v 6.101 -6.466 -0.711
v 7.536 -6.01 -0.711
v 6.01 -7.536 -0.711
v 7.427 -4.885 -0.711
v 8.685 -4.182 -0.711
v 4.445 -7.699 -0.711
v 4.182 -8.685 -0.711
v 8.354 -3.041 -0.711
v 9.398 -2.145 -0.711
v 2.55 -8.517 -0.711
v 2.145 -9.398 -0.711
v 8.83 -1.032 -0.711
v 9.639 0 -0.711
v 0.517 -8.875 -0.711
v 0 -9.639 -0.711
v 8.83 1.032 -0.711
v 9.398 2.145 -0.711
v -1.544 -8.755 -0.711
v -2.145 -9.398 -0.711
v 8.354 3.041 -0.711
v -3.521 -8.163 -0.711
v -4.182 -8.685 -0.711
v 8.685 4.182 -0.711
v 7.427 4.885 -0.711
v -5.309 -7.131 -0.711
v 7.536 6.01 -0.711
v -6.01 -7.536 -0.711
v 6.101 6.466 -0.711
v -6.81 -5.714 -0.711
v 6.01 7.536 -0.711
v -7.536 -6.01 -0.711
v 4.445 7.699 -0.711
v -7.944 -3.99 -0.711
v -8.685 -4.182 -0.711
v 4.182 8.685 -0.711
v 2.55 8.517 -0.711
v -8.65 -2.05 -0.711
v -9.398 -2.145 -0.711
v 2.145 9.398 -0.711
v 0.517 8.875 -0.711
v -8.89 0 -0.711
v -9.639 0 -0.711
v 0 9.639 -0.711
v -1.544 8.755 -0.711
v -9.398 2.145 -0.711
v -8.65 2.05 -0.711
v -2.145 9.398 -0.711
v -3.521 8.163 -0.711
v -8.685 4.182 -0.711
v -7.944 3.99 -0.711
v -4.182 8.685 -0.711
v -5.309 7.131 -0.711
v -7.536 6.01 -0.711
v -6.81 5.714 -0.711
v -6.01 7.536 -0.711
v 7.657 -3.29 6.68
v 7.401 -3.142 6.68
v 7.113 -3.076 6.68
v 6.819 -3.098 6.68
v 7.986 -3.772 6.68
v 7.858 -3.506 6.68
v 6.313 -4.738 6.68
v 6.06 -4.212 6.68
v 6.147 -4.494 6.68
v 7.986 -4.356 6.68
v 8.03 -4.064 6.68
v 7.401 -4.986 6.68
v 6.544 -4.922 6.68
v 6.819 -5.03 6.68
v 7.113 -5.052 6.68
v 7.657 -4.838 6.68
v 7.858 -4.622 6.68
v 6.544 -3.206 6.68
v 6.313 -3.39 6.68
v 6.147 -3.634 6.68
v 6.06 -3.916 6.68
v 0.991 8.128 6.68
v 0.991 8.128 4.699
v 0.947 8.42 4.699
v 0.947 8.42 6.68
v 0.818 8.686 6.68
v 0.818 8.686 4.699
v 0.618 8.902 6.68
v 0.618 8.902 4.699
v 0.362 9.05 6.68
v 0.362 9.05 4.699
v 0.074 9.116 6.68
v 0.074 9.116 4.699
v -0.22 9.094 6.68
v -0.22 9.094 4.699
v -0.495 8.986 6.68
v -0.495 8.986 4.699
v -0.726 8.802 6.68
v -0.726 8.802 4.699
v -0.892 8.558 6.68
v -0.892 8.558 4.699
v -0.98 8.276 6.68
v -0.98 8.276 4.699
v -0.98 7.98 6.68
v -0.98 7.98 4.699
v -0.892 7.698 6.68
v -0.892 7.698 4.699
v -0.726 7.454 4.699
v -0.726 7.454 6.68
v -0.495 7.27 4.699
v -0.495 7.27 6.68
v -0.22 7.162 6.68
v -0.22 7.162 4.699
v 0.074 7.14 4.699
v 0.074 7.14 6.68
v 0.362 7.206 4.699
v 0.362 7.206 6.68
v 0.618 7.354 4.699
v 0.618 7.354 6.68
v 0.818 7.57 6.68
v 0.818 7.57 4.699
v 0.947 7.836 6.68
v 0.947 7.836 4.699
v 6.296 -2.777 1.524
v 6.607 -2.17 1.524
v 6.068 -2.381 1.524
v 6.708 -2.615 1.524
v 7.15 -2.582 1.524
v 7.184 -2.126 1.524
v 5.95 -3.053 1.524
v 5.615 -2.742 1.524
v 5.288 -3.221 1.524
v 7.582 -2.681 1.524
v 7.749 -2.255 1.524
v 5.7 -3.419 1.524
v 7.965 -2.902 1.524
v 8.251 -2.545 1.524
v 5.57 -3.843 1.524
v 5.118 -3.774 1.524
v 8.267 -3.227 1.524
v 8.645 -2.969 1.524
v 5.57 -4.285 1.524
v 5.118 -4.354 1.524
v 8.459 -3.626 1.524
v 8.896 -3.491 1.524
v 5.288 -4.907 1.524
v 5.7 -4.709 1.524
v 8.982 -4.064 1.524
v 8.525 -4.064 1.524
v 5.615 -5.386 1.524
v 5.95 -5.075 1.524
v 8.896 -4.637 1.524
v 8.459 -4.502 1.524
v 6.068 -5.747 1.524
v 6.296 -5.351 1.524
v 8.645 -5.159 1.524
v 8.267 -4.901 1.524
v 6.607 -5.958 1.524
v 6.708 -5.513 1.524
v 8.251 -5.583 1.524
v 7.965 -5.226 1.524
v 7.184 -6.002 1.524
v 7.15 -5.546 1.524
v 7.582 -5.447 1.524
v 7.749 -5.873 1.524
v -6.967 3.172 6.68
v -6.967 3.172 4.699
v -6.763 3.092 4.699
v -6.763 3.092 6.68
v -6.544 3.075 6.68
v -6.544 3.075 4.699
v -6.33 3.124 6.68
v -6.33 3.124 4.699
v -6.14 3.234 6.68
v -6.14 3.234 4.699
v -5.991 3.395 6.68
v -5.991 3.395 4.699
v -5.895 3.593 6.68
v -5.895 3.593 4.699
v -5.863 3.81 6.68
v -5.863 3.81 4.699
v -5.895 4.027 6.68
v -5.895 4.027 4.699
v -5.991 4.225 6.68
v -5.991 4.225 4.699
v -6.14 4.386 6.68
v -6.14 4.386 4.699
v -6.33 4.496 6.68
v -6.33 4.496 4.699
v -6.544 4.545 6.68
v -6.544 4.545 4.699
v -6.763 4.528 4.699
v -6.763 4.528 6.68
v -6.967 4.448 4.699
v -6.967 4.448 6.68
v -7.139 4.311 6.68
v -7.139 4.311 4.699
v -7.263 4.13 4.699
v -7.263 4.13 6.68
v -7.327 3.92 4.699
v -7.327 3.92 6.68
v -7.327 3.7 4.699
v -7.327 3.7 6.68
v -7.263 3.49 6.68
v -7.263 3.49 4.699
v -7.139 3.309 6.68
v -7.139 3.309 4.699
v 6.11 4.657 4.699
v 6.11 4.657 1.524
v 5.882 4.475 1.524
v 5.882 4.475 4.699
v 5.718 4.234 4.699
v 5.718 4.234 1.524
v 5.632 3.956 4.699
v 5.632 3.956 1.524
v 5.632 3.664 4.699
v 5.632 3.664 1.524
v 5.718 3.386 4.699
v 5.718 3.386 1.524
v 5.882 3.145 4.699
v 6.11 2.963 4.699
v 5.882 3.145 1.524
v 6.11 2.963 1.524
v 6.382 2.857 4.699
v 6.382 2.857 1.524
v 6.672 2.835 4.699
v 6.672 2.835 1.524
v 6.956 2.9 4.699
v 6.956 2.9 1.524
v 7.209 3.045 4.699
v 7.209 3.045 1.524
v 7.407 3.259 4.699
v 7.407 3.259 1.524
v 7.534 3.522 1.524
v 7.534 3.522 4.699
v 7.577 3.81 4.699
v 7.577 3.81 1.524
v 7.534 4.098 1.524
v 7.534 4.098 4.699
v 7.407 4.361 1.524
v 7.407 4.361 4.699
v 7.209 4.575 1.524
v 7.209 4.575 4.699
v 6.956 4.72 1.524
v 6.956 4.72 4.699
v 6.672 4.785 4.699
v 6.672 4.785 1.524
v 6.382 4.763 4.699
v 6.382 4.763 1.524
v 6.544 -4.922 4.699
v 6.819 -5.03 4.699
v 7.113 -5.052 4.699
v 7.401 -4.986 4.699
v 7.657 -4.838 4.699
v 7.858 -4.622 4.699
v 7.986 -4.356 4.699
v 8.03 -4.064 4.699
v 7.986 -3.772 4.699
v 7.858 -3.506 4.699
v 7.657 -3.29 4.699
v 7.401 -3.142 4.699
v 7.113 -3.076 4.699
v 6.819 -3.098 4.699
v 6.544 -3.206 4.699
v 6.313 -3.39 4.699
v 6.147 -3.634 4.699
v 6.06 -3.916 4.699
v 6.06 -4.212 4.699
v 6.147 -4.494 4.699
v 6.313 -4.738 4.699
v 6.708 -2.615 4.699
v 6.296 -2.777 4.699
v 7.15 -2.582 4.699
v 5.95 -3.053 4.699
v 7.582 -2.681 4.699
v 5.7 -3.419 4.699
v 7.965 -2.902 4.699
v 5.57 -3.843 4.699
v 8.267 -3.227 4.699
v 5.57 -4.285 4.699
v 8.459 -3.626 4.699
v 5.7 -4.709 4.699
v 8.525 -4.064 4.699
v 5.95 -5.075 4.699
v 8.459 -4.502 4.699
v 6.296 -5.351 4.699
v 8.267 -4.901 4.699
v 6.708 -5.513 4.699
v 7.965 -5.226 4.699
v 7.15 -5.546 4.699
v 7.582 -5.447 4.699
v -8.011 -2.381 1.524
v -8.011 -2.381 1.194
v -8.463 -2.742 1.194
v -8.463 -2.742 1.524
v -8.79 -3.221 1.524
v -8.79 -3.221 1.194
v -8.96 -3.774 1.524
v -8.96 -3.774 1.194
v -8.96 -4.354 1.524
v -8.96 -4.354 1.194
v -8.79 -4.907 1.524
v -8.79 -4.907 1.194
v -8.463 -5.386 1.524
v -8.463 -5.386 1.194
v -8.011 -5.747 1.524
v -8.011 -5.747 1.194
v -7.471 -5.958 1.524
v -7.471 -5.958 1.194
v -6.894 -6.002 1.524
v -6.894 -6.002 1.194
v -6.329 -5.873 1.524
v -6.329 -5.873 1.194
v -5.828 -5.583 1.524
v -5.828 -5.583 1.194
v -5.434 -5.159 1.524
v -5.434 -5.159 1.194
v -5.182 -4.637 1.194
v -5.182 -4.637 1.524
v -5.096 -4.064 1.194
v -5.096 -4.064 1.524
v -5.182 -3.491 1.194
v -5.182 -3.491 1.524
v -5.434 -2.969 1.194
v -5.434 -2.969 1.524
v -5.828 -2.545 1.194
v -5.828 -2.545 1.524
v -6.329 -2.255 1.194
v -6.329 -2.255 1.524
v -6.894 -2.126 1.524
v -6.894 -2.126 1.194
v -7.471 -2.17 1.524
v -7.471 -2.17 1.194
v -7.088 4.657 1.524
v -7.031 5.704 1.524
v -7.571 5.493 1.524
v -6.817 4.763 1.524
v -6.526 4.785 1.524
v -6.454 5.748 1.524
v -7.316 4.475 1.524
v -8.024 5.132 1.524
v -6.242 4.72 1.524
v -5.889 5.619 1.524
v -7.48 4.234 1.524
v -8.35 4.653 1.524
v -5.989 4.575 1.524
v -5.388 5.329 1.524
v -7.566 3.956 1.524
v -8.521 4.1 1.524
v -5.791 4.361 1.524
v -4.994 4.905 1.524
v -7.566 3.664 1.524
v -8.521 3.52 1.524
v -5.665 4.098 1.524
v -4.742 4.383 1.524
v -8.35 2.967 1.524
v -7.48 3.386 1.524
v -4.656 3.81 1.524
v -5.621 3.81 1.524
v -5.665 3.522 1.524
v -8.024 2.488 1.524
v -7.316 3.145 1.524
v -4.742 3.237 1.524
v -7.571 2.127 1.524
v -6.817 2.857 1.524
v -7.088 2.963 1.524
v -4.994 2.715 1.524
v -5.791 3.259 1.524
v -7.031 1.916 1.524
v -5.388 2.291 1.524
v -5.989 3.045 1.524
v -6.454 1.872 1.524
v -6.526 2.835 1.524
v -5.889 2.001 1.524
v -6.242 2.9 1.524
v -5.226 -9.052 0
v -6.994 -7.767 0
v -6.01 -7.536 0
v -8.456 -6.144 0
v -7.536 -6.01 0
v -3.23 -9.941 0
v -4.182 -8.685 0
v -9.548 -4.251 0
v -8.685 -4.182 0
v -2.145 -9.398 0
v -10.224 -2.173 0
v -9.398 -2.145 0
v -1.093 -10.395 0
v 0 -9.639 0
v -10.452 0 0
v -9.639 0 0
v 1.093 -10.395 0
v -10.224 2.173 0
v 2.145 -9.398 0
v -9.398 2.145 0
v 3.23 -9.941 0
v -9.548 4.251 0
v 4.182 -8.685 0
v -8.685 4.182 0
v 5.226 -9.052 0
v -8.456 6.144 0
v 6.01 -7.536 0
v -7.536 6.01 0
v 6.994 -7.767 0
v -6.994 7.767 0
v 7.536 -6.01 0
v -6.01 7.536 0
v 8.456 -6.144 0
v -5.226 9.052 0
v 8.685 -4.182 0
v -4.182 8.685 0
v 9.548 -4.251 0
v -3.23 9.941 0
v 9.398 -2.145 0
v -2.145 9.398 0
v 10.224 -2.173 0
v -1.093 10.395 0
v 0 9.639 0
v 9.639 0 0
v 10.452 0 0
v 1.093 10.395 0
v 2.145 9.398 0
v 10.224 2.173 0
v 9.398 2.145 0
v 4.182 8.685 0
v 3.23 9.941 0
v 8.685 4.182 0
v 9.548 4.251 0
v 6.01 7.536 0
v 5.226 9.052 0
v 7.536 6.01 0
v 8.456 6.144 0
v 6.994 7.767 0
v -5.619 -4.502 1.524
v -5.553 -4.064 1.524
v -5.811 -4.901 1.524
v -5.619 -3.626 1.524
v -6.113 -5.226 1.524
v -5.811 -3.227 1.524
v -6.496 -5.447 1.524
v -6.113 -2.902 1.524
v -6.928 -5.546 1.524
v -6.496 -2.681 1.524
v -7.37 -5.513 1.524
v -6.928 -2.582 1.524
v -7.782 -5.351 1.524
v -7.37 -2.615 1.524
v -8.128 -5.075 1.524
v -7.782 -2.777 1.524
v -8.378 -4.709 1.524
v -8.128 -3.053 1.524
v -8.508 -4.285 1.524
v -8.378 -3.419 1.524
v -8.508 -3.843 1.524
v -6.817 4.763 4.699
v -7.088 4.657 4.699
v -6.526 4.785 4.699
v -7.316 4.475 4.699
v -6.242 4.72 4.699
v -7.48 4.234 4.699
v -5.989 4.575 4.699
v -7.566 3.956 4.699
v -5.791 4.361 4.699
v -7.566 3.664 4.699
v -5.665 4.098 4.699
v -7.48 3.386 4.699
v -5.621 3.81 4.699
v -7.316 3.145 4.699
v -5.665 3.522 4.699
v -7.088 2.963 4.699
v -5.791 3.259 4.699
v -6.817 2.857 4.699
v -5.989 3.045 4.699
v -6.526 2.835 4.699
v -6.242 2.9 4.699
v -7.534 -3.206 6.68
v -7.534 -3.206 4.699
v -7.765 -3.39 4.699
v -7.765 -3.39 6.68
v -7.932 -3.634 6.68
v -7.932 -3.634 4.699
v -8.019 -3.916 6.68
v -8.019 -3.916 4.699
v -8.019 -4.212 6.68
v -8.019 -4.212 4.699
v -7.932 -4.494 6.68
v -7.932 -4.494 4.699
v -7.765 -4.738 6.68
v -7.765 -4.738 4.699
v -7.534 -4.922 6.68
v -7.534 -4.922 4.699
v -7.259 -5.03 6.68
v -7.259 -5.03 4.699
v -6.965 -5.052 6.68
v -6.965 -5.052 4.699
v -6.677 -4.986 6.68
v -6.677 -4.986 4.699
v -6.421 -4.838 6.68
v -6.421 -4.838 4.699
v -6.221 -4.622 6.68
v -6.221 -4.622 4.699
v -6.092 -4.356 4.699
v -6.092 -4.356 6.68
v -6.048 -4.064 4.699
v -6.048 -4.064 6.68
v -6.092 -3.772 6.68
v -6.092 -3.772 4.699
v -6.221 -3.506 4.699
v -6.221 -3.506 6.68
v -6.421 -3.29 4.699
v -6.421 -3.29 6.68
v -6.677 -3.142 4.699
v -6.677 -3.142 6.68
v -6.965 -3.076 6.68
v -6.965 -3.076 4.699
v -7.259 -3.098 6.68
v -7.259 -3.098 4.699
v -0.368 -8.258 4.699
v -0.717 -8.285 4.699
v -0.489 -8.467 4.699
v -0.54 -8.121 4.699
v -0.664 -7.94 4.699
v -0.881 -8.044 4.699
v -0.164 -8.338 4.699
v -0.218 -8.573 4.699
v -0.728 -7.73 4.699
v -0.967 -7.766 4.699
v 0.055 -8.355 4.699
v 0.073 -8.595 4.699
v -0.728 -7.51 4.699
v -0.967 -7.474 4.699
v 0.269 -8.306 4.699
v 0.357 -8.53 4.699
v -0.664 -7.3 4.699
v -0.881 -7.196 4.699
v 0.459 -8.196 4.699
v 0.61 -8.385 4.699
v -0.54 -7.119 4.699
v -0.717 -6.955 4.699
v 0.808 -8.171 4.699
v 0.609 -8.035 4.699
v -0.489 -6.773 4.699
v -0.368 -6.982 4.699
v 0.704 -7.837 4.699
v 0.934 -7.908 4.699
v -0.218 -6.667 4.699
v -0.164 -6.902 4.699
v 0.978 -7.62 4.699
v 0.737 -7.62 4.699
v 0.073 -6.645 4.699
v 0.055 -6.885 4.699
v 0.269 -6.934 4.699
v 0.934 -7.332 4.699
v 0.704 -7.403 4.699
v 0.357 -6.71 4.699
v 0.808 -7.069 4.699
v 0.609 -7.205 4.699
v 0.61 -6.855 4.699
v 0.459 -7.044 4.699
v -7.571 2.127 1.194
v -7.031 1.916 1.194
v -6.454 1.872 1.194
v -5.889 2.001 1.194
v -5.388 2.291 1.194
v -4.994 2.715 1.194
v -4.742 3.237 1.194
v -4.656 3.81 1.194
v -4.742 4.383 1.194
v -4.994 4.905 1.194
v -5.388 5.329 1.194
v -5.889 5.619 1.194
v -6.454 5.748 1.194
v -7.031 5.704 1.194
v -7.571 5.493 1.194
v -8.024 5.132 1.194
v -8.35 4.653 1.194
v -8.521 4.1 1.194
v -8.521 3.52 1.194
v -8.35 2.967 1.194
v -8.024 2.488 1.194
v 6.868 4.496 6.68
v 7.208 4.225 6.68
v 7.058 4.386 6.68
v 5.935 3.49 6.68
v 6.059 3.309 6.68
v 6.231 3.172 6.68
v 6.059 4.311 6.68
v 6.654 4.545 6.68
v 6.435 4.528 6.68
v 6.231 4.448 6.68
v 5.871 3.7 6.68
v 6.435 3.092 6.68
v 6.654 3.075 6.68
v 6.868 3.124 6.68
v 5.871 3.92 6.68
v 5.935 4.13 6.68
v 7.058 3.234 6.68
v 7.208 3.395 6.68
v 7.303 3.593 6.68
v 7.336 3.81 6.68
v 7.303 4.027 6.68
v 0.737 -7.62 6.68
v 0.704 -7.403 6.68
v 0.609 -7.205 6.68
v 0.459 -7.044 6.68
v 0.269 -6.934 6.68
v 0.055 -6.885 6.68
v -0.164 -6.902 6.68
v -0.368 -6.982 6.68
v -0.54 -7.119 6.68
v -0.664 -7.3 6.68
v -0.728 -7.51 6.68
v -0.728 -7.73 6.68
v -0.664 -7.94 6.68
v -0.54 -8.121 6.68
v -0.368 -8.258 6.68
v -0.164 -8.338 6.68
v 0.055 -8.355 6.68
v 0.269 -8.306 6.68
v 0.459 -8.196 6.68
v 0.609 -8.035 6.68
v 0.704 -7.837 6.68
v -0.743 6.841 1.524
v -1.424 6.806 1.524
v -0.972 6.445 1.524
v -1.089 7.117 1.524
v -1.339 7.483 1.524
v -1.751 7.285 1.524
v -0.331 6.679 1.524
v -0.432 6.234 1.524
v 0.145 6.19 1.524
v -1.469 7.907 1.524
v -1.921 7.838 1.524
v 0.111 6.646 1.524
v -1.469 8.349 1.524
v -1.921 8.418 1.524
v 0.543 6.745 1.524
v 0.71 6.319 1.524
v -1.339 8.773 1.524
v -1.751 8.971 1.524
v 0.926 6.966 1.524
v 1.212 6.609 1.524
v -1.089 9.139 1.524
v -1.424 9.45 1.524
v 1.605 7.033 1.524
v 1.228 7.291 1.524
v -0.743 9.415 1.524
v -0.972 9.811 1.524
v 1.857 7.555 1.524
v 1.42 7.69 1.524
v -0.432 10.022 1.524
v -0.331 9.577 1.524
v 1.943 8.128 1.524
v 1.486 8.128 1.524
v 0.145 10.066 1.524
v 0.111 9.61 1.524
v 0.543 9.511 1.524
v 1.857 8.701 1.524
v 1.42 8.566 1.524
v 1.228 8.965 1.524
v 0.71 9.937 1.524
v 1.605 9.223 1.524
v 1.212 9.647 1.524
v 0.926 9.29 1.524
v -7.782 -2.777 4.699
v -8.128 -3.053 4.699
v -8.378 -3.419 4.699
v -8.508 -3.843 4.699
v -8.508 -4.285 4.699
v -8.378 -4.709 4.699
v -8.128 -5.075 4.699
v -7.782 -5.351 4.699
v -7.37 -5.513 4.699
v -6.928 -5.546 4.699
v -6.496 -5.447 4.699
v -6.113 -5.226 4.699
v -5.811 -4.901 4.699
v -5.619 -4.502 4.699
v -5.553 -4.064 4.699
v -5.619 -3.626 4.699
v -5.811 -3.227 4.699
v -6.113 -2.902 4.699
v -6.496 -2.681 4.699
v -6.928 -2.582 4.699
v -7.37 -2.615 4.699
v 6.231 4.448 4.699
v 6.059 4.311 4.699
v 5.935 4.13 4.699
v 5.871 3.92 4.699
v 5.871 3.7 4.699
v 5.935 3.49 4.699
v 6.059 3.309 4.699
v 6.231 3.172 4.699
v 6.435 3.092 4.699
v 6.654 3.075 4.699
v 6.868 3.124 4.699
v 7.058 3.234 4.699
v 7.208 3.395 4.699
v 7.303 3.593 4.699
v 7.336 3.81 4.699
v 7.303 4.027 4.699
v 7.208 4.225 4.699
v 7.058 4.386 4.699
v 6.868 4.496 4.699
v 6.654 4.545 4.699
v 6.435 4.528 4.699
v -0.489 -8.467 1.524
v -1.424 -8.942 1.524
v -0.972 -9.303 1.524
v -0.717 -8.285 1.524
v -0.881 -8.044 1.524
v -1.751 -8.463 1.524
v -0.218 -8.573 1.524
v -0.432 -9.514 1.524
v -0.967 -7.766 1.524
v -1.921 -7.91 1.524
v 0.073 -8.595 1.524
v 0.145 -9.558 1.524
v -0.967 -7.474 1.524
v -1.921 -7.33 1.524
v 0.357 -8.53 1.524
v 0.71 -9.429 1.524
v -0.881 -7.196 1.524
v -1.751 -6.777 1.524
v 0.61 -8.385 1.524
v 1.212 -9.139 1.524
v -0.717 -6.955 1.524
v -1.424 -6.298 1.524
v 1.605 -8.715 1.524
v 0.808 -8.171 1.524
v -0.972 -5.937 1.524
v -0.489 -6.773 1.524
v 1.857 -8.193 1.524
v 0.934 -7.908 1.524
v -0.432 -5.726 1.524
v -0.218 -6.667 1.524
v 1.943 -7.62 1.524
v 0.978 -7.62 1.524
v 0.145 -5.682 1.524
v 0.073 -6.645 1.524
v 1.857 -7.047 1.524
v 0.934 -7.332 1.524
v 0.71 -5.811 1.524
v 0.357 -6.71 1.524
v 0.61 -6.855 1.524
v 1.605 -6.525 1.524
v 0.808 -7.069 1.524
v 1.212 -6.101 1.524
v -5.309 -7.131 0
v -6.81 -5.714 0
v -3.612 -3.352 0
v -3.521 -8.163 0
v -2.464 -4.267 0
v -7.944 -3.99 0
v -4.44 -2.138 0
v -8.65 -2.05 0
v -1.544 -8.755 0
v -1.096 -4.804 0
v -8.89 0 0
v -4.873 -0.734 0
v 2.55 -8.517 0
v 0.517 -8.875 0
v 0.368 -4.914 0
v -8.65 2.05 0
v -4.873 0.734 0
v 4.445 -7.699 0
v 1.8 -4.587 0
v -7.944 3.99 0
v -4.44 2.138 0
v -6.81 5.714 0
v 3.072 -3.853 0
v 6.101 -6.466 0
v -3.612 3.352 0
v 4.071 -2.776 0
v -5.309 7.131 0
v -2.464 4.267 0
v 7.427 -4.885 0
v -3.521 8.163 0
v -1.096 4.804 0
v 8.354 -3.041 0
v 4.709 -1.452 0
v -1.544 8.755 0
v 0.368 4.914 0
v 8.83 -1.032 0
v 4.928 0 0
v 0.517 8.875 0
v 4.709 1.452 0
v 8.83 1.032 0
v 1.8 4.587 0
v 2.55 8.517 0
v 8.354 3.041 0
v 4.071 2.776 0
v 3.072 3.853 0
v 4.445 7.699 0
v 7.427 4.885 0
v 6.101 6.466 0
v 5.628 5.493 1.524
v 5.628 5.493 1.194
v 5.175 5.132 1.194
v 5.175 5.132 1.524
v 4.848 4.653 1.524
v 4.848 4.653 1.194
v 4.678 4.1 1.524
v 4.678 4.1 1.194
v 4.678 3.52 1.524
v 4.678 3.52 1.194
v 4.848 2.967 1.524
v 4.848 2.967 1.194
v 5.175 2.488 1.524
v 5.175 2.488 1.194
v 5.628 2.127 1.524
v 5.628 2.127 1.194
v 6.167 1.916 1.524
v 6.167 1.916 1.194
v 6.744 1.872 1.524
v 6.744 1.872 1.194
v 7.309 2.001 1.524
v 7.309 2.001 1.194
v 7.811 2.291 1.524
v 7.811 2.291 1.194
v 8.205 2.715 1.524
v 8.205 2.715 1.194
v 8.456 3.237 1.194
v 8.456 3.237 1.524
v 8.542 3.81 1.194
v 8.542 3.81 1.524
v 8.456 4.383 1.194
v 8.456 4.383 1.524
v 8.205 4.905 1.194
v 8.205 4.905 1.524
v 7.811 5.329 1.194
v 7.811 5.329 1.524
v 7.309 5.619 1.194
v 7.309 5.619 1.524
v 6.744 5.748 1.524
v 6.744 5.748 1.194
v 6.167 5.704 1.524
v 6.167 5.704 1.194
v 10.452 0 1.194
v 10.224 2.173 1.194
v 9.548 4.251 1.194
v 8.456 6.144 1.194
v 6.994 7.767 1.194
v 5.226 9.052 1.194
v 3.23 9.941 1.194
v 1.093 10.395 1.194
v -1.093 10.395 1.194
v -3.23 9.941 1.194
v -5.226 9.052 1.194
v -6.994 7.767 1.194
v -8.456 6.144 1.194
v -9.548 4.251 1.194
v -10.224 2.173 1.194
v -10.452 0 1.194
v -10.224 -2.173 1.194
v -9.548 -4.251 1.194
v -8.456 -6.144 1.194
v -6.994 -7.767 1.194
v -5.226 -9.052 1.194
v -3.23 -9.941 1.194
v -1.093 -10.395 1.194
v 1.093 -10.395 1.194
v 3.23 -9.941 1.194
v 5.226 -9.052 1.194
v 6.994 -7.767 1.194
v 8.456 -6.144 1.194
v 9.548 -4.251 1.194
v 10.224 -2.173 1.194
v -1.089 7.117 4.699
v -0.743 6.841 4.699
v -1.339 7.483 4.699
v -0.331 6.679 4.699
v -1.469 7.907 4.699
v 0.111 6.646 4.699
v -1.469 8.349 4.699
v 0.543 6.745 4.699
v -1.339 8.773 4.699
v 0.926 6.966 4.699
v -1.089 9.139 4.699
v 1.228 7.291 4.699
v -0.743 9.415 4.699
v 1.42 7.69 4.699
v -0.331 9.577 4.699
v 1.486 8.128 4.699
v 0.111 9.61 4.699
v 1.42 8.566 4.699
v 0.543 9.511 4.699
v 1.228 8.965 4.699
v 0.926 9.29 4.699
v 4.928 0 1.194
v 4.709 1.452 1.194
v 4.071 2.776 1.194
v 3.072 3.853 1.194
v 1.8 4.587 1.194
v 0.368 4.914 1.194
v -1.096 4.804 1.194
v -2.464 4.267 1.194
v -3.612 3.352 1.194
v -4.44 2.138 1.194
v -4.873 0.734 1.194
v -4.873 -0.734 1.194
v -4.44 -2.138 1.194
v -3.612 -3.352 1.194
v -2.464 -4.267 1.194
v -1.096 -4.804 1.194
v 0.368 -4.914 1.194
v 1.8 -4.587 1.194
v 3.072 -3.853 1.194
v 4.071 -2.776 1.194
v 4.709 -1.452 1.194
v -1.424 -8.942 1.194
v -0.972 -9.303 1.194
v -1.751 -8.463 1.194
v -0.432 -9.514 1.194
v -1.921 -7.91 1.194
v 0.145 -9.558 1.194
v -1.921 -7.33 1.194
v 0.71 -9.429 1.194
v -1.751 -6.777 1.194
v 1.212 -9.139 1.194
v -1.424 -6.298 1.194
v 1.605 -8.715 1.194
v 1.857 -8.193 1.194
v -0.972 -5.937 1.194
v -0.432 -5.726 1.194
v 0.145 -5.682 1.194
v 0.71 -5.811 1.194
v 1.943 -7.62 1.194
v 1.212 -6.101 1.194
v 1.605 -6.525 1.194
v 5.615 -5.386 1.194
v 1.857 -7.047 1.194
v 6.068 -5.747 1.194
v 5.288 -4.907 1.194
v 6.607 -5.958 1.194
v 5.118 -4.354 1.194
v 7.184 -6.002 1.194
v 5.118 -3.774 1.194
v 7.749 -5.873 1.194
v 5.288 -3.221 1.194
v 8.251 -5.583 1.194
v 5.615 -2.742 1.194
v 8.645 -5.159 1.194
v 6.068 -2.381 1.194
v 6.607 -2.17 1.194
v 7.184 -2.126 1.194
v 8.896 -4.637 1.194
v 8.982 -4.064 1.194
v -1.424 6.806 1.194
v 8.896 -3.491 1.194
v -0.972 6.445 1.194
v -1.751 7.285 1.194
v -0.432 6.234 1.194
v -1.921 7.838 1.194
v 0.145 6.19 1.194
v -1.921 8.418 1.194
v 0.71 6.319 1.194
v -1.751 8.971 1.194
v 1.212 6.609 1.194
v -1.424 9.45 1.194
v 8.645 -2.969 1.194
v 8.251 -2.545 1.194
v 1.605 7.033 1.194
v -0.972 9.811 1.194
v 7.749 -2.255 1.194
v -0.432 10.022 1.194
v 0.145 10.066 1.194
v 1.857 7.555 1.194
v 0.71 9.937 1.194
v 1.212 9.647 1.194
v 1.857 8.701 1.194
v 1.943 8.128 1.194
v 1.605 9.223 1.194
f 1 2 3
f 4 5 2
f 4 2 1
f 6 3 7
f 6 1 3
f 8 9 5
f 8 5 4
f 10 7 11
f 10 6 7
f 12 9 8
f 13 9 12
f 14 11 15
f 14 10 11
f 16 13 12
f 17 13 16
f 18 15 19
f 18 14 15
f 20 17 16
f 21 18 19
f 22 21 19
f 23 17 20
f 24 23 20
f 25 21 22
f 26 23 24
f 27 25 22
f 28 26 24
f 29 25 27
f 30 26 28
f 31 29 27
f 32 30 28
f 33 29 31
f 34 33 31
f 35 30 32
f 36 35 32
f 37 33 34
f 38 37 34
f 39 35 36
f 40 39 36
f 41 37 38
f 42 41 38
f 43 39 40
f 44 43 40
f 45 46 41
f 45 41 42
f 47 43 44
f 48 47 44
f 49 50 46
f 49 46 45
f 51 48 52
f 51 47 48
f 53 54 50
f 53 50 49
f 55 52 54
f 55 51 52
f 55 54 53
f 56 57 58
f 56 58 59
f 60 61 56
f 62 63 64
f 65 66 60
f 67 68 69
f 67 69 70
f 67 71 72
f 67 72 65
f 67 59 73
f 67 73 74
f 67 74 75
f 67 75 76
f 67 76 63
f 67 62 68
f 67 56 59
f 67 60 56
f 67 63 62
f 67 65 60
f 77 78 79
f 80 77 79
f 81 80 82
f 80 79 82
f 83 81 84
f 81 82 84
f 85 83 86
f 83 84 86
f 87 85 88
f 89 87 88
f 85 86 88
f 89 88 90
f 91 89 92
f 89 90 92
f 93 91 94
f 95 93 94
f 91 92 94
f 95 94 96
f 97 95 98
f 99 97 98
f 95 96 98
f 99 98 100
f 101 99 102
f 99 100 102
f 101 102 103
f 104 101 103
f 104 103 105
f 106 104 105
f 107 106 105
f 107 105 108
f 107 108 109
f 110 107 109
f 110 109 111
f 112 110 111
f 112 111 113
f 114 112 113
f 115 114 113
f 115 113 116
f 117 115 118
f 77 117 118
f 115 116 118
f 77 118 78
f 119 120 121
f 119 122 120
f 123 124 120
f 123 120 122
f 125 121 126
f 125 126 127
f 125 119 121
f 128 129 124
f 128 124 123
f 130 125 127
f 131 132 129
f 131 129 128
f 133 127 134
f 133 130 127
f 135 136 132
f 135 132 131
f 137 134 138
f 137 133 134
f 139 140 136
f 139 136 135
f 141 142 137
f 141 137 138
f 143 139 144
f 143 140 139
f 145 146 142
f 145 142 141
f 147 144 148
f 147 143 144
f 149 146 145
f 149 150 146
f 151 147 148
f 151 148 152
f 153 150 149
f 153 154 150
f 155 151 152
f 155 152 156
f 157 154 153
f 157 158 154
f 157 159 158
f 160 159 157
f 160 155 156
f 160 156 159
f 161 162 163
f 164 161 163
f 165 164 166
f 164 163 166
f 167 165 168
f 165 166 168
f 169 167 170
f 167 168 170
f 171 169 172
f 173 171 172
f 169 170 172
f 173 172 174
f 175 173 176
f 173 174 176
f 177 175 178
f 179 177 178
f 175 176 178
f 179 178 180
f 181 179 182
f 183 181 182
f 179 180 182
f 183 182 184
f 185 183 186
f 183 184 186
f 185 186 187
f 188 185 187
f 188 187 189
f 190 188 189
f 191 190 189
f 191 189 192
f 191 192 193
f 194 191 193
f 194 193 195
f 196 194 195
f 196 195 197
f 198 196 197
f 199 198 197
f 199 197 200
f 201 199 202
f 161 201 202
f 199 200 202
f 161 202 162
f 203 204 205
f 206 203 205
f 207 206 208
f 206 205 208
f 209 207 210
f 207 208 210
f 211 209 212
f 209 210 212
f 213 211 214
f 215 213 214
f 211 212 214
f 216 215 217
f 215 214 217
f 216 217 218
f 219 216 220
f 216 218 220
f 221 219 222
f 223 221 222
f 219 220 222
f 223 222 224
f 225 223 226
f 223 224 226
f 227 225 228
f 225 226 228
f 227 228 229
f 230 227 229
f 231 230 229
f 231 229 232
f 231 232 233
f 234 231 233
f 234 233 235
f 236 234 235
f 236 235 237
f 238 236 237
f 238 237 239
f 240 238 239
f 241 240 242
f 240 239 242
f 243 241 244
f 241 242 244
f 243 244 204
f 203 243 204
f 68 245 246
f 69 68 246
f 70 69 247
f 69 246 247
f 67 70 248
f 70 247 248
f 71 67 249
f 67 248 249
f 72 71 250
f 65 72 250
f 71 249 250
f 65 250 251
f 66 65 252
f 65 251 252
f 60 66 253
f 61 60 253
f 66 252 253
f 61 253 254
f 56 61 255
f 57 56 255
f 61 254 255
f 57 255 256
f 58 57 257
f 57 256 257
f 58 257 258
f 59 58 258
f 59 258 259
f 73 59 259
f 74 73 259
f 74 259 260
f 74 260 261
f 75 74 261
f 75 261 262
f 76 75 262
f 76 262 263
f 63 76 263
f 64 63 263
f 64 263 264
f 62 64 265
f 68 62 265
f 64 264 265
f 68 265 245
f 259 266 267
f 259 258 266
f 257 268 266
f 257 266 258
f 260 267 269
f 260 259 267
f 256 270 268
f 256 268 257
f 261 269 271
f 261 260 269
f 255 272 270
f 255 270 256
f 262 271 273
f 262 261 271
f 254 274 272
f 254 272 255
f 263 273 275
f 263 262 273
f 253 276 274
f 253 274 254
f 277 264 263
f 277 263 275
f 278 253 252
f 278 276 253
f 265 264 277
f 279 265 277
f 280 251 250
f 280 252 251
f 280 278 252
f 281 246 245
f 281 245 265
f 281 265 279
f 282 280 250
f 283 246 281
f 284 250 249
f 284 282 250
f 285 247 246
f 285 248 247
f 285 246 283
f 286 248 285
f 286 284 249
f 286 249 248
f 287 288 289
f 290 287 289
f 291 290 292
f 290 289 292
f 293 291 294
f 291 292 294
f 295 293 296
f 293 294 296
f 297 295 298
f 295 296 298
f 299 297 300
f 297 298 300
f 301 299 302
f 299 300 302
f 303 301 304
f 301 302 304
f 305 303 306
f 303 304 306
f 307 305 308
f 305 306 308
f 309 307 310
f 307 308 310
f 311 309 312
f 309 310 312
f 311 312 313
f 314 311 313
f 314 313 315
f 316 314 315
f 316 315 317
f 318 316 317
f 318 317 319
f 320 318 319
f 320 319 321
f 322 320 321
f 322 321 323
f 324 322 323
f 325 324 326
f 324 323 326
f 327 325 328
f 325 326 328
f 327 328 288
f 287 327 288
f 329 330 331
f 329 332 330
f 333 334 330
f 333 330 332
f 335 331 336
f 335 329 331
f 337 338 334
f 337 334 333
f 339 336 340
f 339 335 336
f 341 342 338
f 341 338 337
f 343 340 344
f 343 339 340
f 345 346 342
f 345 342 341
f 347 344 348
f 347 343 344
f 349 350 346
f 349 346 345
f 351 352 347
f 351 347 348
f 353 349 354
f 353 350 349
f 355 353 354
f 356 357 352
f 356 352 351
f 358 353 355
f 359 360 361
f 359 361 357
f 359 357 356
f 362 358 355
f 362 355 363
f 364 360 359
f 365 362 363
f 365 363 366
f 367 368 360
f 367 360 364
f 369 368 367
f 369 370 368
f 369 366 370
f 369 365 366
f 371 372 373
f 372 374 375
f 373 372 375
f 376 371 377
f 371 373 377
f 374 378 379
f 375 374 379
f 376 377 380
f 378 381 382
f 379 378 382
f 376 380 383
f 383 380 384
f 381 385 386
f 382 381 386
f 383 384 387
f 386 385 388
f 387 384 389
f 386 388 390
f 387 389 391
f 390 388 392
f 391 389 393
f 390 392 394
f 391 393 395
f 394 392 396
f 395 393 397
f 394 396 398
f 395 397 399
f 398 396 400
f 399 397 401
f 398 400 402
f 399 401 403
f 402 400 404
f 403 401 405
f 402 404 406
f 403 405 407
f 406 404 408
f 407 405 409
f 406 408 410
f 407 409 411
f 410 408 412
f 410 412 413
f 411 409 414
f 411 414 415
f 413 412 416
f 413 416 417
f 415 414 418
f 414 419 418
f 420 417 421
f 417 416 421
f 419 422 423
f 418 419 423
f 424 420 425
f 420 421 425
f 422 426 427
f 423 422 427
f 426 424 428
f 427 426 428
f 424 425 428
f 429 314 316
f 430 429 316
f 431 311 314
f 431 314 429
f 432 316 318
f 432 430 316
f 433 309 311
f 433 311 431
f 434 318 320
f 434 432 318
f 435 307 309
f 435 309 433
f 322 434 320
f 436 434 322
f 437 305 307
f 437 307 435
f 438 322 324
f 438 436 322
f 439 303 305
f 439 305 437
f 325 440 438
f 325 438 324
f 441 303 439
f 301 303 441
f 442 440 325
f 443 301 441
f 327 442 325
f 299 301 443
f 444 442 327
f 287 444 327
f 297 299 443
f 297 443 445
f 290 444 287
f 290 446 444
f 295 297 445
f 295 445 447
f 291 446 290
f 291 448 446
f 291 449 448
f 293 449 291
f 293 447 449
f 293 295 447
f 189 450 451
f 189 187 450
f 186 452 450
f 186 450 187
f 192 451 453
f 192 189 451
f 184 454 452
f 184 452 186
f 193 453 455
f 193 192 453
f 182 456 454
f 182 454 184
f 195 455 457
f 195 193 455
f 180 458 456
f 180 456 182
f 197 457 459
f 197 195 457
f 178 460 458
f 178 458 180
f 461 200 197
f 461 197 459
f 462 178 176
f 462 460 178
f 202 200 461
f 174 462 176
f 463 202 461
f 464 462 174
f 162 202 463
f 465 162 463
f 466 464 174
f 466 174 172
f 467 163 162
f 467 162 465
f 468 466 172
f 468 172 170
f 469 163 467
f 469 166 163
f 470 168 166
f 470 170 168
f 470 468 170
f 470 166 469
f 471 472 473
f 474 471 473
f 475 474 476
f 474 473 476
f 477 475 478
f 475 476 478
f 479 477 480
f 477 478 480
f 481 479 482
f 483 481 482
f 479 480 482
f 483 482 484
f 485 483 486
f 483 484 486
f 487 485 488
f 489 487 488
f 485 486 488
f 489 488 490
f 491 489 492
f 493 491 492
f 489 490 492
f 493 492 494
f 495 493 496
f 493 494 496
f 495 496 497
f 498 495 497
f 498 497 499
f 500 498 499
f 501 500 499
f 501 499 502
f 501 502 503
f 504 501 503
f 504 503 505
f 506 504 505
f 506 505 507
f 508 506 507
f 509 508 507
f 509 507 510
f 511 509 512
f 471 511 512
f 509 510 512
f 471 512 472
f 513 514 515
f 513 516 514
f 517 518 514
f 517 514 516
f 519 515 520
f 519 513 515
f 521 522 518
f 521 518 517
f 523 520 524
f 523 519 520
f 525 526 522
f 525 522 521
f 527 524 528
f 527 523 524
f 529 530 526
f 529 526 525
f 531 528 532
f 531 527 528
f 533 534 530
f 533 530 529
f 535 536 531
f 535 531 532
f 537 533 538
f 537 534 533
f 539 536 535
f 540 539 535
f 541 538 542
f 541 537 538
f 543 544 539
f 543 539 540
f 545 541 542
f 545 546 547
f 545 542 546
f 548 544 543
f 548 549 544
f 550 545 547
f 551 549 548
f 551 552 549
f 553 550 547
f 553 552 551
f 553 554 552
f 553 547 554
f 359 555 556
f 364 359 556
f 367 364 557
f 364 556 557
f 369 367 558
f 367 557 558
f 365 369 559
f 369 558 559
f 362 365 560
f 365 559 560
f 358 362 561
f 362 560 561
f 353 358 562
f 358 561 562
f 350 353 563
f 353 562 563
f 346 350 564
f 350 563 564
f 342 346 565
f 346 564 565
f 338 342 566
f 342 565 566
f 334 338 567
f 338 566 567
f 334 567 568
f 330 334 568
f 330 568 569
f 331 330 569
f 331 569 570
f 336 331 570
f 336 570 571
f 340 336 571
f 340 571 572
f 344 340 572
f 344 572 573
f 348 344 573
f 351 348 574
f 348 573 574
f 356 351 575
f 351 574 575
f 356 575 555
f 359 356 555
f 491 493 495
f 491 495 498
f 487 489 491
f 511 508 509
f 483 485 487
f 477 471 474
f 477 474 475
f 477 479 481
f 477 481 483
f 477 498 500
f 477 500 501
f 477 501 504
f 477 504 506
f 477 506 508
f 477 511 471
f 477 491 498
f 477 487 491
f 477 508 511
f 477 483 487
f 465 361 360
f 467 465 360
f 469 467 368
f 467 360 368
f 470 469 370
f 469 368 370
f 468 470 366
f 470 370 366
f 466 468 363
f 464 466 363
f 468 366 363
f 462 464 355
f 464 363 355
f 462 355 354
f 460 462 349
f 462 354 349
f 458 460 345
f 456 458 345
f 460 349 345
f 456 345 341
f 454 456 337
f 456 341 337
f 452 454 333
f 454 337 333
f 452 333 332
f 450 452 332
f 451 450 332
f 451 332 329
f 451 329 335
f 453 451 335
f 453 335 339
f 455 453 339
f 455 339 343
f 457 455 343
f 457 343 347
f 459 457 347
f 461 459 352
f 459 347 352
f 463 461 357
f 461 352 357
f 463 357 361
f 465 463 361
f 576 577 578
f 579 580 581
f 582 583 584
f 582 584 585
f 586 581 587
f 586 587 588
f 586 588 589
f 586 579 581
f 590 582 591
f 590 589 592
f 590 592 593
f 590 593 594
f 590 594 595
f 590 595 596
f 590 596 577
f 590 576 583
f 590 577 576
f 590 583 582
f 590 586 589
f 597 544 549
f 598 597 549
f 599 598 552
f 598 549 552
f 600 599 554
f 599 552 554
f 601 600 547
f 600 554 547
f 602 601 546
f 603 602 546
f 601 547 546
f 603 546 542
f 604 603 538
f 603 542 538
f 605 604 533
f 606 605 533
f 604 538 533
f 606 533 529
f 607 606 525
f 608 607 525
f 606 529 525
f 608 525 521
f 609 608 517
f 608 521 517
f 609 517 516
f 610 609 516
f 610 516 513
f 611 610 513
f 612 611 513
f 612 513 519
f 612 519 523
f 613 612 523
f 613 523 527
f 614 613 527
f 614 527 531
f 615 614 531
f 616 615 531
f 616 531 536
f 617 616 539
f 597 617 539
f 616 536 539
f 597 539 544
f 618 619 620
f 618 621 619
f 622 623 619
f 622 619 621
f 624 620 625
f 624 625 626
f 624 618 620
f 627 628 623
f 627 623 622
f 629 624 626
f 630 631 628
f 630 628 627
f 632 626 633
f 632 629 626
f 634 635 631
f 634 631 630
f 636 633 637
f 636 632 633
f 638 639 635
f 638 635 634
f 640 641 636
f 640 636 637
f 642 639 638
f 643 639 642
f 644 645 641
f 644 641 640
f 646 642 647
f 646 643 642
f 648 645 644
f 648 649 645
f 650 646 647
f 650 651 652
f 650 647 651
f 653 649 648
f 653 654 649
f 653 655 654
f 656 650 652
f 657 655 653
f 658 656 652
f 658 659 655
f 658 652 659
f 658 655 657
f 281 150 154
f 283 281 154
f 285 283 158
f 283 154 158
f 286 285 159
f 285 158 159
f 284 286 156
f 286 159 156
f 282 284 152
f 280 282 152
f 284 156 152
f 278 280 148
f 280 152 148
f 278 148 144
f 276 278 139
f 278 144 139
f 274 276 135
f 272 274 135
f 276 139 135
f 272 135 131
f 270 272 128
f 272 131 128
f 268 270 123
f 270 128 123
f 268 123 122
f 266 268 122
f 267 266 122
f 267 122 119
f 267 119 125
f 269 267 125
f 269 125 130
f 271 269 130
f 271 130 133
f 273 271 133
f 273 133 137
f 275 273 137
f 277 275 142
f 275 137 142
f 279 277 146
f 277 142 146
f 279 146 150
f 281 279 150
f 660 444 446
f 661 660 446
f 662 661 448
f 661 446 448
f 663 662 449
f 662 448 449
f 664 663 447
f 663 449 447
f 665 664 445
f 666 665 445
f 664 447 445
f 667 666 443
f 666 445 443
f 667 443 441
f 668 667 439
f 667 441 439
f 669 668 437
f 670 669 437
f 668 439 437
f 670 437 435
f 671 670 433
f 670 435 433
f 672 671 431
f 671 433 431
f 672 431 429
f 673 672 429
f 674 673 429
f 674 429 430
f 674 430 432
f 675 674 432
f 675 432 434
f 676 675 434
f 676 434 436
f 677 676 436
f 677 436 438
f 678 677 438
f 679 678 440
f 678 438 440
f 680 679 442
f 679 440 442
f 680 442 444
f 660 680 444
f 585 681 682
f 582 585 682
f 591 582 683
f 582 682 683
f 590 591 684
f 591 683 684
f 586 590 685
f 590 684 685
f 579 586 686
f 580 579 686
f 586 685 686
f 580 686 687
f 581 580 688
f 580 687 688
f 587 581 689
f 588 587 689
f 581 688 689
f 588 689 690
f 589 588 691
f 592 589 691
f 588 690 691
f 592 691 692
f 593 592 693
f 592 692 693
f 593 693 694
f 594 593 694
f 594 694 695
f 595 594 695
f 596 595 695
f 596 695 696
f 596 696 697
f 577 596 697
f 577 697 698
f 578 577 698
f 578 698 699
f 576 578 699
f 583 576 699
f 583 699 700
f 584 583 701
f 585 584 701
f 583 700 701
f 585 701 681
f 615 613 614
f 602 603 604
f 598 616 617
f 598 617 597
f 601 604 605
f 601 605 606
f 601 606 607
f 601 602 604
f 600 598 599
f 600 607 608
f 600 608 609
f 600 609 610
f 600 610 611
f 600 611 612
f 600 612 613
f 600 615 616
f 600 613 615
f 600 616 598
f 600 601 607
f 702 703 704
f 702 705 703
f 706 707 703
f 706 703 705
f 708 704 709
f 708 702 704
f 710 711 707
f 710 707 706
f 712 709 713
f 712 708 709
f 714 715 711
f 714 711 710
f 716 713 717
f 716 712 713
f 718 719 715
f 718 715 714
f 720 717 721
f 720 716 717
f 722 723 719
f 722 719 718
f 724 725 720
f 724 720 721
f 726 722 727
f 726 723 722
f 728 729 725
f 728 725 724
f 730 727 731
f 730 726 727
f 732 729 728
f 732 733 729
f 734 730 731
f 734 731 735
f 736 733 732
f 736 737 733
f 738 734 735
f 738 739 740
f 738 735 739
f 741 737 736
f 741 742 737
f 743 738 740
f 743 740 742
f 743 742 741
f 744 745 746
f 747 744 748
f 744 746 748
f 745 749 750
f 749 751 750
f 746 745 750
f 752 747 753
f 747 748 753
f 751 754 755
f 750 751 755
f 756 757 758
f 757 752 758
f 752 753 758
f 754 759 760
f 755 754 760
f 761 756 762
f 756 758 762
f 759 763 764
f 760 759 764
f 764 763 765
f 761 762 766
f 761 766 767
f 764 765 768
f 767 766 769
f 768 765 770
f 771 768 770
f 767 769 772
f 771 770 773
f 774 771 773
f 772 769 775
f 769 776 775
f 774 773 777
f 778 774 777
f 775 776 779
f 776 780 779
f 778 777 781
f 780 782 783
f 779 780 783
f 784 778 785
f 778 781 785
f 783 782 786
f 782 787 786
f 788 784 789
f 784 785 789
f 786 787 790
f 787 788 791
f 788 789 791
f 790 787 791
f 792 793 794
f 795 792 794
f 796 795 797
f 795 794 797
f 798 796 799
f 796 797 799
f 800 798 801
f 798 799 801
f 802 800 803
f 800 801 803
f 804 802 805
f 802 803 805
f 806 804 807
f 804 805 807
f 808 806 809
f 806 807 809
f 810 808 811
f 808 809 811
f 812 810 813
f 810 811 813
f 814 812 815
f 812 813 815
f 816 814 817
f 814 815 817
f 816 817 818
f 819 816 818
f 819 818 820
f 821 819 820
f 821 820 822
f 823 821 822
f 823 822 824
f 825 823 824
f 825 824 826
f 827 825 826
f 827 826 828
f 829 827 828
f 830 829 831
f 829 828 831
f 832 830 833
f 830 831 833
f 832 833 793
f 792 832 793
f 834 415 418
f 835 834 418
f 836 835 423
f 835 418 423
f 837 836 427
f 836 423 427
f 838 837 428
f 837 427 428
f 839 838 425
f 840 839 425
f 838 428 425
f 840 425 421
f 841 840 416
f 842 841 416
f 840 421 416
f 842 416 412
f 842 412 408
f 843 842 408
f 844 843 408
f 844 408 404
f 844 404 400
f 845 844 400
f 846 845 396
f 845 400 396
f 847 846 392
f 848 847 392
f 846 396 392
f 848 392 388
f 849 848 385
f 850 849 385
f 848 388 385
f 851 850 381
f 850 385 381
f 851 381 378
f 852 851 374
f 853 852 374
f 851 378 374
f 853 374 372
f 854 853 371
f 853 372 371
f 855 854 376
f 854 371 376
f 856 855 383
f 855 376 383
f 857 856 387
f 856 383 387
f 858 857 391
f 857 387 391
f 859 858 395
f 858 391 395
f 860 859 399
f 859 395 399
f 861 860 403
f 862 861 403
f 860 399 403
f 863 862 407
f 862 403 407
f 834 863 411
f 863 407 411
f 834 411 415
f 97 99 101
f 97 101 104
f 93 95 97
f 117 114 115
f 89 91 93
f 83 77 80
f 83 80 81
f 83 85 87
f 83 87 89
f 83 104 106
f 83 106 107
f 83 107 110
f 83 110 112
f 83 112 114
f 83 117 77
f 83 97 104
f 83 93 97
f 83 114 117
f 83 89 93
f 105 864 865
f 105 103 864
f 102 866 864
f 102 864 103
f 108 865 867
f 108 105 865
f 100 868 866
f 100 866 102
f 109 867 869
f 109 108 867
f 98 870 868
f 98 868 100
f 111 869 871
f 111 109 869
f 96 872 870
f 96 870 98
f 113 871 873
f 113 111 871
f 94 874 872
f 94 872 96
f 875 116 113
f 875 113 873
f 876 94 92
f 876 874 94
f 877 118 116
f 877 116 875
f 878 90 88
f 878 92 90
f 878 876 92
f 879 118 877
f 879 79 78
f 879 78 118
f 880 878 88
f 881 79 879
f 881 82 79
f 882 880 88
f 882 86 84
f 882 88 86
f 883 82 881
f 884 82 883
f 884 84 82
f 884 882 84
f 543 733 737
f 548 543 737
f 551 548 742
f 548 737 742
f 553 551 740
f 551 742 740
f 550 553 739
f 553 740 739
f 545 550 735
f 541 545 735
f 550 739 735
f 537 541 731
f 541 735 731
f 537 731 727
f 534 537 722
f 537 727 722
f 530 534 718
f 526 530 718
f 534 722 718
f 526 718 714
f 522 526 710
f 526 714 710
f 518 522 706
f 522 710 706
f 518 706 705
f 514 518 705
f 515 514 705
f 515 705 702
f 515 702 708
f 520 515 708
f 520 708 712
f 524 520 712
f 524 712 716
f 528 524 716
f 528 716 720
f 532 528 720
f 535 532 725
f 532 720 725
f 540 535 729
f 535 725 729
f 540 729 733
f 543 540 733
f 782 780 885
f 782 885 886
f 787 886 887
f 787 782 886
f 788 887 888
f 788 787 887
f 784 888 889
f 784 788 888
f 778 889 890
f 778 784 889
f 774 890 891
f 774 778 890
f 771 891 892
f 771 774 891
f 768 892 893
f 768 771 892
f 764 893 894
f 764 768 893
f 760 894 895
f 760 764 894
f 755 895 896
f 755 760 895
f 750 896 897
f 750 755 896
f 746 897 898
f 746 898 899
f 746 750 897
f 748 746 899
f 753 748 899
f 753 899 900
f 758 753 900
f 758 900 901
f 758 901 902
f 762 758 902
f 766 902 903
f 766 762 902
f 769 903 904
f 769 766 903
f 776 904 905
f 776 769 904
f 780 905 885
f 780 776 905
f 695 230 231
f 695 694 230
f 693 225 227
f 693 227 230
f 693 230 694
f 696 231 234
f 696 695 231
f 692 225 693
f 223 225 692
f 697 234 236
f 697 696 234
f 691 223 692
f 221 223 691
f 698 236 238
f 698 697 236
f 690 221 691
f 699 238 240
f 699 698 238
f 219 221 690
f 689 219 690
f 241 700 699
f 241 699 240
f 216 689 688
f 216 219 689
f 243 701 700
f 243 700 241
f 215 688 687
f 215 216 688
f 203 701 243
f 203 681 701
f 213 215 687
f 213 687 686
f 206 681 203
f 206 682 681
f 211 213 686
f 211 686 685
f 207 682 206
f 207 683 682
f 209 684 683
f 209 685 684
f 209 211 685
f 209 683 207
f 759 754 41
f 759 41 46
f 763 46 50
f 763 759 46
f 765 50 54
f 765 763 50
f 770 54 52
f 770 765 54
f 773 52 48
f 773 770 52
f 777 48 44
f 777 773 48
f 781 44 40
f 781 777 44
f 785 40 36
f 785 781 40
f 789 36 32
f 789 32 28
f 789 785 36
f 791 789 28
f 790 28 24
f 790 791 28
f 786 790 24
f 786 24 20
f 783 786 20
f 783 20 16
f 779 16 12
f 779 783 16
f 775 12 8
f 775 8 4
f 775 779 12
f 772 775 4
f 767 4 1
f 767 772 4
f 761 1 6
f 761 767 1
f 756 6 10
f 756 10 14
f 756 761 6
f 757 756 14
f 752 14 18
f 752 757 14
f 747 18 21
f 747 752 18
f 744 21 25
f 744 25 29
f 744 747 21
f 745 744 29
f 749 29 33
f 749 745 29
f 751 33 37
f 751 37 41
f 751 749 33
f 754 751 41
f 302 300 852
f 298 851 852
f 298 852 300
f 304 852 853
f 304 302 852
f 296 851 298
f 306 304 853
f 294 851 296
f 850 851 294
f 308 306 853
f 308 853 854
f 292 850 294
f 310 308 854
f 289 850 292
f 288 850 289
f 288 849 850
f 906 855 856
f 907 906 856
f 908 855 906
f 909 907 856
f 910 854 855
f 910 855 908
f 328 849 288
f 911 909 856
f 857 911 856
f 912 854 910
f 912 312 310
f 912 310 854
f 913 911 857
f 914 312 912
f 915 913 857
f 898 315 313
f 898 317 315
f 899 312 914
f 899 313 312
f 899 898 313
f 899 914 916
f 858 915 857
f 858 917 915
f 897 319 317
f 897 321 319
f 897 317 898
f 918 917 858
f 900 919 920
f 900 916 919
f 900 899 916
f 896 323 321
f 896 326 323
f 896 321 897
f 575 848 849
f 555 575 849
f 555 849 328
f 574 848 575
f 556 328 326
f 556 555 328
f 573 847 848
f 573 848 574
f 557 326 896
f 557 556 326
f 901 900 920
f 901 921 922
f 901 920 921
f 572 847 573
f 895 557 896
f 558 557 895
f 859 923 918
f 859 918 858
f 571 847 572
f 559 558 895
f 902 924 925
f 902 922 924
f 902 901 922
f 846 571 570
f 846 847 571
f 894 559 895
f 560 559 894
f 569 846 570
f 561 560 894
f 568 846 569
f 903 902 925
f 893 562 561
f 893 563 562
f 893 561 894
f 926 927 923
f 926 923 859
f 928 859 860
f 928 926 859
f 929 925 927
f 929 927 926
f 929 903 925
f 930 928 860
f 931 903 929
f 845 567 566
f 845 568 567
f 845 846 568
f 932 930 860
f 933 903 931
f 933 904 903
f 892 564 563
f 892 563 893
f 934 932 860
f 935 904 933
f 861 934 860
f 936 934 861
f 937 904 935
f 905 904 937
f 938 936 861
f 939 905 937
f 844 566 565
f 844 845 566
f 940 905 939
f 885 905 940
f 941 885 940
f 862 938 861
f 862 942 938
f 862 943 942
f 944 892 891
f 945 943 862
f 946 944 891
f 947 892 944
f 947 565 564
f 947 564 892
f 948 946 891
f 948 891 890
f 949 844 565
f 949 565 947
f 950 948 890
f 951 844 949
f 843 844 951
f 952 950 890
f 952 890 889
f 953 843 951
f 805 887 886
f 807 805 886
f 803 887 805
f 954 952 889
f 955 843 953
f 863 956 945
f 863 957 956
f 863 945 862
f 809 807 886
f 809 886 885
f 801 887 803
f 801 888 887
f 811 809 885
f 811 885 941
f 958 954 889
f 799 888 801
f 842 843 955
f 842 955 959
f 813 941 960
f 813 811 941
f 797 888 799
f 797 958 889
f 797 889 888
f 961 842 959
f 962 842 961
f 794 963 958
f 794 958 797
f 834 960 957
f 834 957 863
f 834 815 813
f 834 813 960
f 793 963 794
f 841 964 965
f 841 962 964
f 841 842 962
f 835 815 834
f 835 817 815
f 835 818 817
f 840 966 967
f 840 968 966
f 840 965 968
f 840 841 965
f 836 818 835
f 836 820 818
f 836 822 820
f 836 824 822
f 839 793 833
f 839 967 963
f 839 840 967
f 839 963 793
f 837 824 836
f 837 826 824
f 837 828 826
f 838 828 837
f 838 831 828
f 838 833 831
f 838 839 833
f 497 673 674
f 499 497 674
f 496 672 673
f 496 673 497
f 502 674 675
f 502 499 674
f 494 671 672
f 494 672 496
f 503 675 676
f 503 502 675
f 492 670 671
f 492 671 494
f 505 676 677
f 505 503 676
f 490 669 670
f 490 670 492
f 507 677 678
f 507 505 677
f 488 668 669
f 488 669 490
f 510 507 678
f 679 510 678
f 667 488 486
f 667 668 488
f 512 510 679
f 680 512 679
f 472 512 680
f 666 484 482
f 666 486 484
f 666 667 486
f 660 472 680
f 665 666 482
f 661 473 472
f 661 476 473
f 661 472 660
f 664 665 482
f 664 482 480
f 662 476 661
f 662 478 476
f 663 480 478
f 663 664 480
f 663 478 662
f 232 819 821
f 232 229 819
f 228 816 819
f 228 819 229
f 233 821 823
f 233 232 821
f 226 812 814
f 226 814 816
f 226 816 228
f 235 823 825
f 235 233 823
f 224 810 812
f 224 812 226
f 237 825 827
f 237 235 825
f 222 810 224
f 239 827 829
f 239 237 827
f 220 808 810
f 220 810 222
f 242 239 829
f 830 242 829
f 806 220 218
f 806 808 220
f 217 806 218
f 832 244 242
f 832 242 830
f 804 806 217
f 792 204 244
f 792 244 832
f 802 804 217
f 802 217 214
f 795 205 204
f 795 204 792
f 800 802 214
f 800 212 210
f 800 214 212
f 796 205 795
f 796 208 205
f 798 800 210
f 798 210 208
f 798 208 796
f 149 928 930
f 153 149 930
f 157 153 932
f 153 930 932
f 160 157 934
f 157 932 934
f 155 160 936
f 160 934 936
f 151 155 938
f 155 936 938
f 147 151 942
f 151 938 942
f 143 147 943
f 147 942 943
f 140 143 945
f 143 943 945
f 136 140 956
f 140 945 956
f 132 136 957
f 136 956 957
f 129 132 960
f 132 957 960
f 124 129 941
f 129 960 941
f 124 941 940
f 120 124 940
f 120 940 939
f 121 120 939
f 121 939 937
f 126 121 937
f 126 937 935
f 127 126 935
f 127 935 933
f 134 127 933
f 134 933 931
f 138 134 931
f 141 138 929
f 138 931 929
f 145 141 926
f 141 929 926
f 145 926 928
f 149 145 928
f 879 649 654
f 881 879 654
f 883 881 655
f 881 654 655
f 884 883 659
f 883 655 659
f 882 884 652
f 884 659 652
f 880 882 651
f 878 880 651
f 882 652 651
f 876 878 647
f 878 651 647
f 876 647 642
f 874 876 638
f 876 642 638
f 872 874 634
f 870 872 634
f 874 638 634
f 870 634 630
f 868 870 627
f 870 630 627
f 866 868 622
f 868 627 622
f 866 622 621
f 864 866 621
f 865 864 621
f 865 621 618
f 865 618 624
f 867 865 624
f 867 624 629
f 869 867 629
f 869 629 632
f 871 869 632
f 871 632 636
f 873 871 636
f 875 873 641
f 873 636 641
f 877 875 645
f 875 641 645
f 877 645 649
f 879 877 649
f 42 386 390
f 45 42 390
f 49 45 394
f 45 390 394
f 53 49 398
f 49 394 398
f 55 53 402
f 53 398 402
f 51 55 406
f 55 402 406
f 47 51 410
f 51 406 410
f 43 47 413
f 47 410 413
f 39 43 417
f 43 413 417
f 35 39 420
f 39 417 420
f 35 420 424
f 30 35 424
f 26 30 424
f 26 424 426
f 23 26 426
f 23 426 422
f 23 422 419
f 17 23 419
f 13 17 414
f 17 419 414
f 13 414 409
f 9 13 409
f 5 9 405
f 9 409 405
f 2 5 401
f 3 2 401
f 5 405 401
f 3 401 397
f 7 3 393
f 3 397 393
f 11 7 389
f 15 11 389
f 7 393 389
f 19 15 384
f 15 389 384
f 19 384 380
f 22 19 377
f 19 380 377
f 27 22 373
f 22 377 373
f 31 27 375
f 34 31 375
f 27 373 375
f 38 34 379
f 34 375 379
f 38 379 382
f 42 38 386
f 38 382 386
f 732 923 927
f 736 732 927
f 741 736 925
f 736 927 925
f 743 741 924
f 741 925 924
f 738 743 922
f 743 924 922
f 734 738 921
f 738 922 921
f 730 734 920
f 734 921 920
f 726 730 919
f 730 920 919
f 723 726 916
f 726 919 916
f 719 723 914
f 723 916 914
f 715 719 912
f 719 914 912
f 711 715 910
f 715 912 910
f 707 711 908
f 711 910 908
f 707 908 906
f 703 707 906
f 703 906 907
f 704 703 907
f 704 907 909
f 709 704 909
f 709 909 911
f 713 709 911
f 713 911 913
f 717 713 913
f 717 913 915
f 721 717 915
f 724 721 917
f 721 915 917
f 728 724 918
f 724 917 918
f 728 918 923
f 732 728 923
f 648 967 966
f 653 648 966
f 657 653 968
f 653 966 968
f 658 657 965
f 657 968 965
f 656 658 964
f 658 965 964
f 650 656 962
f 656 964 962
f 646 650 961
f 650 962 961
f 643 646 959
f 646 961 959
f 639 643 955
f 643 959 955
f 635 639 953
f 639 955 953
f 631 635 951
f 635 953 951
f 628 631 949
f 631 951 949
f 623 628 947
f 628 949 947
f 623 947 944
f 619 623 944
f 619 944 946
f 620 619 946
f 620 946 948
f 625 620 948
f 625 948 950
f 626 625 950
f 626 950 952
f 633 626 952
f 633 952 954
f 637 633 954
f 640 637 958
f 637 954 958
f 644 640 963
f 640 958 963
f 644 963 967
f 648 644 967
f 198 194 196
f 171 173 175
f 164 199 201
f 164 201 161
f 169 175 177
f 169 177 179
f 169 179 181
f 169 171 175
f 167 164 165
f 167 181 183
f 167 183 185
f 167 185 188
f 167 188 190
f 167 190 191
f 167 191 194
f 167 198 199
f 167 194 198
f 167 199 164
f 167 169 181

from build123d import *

# Parameters (mm, degrees)
SKETCH1_R         = 10.4521
SKETCH1_R_2       = 4.9276
BASE_DEPTH        = 1.1938
SKETCH2_R         = 9.6393
SKETCH2_R_2       = 8.89
TRACK_DEPTH       = 0.7112
SKETCH3_R         = 1.9431
PLATFORM_1_DEPTH  = 0.3302
SKETCH4_R         = 1.4859
SKETCH4_R_2       = 0.9779
PLATFORM_2_DEPTH  = 3.175
SKETCH5_R         = 0.9906
SKETCH5_R_2       = 0.7366
PLATFORM_3_DEPTH  = 1.9812
CIRPATTERN1_COUNT = 3


with BuildPart() as part:
    # Sketch1 → Base (new body)
    with BuildSketch(Plane.XY):
        Circle(SKETCH1_R)
        Circle(SKETCH1_R_2, mode=Mode.SUBTRACT)
    extrude(amount=BASE_DEPTH)

    # Sketch2 → Track (add)
    with BuildSketch(Plane(origin=(0, 0, 0), x_dir=(-1, 0, 0), z_dir=(0, 0, -1))):
        Circle(SKETCH2_R)
        Circle(SKETCH2_R_2, mode=Mode.SUBTRACT)
    extrude(amount=TRACK_DEPTH)

    # Sketch3 → Platform 1 (add)
    with BuildSketch(Plane.XY.offset(1.1938)):
        with Locations((0, 8.128)):
            Circle(SKETCH3_R)
        with Locations((0, -7.62)):
            Circle(SKETCH3_R)
    platform_1 = extrude(amount=PLATFORM_1_DEPTH)

    # Sketch4 → Platform 2 (add)
    with BuildSketch(Plane.XY.offset(1.524)):
        with Locations((0, 8.128)):
            Circle(SKETCH4_R)
        with Locations((0, -7.62)):
            Circle(SKETCH4_R_2)
    platform_2 = extrude(amount=PLATFORM_2_DEPTH)

    # Sketch5 → Platform 3 (add)
    with BuildSketch(Plane.XY.offset(4.699)):
        with Locations((0, 8.128)):
            Circle(SKETCH5_R)
        with Locations((0, -7.62)):
            Circle(SKETCH5_R_2)
    platform_3 = extrude(amount=PLATFORM_3_DEPTH)

    # CirPattern1: Platform 1, Platform 2, Platform 3 ×3 about axis
    cirpattern1_axis = Axis((0, 0, 0), (0, 0, 1))
    for i in range(1, CIRPATTERN1_COUNT):
        add(platform_1.rotate(cirpattern1_axis, i * 360 / CIRPATTERN1_COUNT))
        add(platform_2.rotate(cirpattern1_axis, i * 360 / CIRPATTERN1_COUNT))
        add(platform_3.rotate(cirpattern1_axis, i * 360 / CIRPATTERN1_COUNT))


solid = part.part
